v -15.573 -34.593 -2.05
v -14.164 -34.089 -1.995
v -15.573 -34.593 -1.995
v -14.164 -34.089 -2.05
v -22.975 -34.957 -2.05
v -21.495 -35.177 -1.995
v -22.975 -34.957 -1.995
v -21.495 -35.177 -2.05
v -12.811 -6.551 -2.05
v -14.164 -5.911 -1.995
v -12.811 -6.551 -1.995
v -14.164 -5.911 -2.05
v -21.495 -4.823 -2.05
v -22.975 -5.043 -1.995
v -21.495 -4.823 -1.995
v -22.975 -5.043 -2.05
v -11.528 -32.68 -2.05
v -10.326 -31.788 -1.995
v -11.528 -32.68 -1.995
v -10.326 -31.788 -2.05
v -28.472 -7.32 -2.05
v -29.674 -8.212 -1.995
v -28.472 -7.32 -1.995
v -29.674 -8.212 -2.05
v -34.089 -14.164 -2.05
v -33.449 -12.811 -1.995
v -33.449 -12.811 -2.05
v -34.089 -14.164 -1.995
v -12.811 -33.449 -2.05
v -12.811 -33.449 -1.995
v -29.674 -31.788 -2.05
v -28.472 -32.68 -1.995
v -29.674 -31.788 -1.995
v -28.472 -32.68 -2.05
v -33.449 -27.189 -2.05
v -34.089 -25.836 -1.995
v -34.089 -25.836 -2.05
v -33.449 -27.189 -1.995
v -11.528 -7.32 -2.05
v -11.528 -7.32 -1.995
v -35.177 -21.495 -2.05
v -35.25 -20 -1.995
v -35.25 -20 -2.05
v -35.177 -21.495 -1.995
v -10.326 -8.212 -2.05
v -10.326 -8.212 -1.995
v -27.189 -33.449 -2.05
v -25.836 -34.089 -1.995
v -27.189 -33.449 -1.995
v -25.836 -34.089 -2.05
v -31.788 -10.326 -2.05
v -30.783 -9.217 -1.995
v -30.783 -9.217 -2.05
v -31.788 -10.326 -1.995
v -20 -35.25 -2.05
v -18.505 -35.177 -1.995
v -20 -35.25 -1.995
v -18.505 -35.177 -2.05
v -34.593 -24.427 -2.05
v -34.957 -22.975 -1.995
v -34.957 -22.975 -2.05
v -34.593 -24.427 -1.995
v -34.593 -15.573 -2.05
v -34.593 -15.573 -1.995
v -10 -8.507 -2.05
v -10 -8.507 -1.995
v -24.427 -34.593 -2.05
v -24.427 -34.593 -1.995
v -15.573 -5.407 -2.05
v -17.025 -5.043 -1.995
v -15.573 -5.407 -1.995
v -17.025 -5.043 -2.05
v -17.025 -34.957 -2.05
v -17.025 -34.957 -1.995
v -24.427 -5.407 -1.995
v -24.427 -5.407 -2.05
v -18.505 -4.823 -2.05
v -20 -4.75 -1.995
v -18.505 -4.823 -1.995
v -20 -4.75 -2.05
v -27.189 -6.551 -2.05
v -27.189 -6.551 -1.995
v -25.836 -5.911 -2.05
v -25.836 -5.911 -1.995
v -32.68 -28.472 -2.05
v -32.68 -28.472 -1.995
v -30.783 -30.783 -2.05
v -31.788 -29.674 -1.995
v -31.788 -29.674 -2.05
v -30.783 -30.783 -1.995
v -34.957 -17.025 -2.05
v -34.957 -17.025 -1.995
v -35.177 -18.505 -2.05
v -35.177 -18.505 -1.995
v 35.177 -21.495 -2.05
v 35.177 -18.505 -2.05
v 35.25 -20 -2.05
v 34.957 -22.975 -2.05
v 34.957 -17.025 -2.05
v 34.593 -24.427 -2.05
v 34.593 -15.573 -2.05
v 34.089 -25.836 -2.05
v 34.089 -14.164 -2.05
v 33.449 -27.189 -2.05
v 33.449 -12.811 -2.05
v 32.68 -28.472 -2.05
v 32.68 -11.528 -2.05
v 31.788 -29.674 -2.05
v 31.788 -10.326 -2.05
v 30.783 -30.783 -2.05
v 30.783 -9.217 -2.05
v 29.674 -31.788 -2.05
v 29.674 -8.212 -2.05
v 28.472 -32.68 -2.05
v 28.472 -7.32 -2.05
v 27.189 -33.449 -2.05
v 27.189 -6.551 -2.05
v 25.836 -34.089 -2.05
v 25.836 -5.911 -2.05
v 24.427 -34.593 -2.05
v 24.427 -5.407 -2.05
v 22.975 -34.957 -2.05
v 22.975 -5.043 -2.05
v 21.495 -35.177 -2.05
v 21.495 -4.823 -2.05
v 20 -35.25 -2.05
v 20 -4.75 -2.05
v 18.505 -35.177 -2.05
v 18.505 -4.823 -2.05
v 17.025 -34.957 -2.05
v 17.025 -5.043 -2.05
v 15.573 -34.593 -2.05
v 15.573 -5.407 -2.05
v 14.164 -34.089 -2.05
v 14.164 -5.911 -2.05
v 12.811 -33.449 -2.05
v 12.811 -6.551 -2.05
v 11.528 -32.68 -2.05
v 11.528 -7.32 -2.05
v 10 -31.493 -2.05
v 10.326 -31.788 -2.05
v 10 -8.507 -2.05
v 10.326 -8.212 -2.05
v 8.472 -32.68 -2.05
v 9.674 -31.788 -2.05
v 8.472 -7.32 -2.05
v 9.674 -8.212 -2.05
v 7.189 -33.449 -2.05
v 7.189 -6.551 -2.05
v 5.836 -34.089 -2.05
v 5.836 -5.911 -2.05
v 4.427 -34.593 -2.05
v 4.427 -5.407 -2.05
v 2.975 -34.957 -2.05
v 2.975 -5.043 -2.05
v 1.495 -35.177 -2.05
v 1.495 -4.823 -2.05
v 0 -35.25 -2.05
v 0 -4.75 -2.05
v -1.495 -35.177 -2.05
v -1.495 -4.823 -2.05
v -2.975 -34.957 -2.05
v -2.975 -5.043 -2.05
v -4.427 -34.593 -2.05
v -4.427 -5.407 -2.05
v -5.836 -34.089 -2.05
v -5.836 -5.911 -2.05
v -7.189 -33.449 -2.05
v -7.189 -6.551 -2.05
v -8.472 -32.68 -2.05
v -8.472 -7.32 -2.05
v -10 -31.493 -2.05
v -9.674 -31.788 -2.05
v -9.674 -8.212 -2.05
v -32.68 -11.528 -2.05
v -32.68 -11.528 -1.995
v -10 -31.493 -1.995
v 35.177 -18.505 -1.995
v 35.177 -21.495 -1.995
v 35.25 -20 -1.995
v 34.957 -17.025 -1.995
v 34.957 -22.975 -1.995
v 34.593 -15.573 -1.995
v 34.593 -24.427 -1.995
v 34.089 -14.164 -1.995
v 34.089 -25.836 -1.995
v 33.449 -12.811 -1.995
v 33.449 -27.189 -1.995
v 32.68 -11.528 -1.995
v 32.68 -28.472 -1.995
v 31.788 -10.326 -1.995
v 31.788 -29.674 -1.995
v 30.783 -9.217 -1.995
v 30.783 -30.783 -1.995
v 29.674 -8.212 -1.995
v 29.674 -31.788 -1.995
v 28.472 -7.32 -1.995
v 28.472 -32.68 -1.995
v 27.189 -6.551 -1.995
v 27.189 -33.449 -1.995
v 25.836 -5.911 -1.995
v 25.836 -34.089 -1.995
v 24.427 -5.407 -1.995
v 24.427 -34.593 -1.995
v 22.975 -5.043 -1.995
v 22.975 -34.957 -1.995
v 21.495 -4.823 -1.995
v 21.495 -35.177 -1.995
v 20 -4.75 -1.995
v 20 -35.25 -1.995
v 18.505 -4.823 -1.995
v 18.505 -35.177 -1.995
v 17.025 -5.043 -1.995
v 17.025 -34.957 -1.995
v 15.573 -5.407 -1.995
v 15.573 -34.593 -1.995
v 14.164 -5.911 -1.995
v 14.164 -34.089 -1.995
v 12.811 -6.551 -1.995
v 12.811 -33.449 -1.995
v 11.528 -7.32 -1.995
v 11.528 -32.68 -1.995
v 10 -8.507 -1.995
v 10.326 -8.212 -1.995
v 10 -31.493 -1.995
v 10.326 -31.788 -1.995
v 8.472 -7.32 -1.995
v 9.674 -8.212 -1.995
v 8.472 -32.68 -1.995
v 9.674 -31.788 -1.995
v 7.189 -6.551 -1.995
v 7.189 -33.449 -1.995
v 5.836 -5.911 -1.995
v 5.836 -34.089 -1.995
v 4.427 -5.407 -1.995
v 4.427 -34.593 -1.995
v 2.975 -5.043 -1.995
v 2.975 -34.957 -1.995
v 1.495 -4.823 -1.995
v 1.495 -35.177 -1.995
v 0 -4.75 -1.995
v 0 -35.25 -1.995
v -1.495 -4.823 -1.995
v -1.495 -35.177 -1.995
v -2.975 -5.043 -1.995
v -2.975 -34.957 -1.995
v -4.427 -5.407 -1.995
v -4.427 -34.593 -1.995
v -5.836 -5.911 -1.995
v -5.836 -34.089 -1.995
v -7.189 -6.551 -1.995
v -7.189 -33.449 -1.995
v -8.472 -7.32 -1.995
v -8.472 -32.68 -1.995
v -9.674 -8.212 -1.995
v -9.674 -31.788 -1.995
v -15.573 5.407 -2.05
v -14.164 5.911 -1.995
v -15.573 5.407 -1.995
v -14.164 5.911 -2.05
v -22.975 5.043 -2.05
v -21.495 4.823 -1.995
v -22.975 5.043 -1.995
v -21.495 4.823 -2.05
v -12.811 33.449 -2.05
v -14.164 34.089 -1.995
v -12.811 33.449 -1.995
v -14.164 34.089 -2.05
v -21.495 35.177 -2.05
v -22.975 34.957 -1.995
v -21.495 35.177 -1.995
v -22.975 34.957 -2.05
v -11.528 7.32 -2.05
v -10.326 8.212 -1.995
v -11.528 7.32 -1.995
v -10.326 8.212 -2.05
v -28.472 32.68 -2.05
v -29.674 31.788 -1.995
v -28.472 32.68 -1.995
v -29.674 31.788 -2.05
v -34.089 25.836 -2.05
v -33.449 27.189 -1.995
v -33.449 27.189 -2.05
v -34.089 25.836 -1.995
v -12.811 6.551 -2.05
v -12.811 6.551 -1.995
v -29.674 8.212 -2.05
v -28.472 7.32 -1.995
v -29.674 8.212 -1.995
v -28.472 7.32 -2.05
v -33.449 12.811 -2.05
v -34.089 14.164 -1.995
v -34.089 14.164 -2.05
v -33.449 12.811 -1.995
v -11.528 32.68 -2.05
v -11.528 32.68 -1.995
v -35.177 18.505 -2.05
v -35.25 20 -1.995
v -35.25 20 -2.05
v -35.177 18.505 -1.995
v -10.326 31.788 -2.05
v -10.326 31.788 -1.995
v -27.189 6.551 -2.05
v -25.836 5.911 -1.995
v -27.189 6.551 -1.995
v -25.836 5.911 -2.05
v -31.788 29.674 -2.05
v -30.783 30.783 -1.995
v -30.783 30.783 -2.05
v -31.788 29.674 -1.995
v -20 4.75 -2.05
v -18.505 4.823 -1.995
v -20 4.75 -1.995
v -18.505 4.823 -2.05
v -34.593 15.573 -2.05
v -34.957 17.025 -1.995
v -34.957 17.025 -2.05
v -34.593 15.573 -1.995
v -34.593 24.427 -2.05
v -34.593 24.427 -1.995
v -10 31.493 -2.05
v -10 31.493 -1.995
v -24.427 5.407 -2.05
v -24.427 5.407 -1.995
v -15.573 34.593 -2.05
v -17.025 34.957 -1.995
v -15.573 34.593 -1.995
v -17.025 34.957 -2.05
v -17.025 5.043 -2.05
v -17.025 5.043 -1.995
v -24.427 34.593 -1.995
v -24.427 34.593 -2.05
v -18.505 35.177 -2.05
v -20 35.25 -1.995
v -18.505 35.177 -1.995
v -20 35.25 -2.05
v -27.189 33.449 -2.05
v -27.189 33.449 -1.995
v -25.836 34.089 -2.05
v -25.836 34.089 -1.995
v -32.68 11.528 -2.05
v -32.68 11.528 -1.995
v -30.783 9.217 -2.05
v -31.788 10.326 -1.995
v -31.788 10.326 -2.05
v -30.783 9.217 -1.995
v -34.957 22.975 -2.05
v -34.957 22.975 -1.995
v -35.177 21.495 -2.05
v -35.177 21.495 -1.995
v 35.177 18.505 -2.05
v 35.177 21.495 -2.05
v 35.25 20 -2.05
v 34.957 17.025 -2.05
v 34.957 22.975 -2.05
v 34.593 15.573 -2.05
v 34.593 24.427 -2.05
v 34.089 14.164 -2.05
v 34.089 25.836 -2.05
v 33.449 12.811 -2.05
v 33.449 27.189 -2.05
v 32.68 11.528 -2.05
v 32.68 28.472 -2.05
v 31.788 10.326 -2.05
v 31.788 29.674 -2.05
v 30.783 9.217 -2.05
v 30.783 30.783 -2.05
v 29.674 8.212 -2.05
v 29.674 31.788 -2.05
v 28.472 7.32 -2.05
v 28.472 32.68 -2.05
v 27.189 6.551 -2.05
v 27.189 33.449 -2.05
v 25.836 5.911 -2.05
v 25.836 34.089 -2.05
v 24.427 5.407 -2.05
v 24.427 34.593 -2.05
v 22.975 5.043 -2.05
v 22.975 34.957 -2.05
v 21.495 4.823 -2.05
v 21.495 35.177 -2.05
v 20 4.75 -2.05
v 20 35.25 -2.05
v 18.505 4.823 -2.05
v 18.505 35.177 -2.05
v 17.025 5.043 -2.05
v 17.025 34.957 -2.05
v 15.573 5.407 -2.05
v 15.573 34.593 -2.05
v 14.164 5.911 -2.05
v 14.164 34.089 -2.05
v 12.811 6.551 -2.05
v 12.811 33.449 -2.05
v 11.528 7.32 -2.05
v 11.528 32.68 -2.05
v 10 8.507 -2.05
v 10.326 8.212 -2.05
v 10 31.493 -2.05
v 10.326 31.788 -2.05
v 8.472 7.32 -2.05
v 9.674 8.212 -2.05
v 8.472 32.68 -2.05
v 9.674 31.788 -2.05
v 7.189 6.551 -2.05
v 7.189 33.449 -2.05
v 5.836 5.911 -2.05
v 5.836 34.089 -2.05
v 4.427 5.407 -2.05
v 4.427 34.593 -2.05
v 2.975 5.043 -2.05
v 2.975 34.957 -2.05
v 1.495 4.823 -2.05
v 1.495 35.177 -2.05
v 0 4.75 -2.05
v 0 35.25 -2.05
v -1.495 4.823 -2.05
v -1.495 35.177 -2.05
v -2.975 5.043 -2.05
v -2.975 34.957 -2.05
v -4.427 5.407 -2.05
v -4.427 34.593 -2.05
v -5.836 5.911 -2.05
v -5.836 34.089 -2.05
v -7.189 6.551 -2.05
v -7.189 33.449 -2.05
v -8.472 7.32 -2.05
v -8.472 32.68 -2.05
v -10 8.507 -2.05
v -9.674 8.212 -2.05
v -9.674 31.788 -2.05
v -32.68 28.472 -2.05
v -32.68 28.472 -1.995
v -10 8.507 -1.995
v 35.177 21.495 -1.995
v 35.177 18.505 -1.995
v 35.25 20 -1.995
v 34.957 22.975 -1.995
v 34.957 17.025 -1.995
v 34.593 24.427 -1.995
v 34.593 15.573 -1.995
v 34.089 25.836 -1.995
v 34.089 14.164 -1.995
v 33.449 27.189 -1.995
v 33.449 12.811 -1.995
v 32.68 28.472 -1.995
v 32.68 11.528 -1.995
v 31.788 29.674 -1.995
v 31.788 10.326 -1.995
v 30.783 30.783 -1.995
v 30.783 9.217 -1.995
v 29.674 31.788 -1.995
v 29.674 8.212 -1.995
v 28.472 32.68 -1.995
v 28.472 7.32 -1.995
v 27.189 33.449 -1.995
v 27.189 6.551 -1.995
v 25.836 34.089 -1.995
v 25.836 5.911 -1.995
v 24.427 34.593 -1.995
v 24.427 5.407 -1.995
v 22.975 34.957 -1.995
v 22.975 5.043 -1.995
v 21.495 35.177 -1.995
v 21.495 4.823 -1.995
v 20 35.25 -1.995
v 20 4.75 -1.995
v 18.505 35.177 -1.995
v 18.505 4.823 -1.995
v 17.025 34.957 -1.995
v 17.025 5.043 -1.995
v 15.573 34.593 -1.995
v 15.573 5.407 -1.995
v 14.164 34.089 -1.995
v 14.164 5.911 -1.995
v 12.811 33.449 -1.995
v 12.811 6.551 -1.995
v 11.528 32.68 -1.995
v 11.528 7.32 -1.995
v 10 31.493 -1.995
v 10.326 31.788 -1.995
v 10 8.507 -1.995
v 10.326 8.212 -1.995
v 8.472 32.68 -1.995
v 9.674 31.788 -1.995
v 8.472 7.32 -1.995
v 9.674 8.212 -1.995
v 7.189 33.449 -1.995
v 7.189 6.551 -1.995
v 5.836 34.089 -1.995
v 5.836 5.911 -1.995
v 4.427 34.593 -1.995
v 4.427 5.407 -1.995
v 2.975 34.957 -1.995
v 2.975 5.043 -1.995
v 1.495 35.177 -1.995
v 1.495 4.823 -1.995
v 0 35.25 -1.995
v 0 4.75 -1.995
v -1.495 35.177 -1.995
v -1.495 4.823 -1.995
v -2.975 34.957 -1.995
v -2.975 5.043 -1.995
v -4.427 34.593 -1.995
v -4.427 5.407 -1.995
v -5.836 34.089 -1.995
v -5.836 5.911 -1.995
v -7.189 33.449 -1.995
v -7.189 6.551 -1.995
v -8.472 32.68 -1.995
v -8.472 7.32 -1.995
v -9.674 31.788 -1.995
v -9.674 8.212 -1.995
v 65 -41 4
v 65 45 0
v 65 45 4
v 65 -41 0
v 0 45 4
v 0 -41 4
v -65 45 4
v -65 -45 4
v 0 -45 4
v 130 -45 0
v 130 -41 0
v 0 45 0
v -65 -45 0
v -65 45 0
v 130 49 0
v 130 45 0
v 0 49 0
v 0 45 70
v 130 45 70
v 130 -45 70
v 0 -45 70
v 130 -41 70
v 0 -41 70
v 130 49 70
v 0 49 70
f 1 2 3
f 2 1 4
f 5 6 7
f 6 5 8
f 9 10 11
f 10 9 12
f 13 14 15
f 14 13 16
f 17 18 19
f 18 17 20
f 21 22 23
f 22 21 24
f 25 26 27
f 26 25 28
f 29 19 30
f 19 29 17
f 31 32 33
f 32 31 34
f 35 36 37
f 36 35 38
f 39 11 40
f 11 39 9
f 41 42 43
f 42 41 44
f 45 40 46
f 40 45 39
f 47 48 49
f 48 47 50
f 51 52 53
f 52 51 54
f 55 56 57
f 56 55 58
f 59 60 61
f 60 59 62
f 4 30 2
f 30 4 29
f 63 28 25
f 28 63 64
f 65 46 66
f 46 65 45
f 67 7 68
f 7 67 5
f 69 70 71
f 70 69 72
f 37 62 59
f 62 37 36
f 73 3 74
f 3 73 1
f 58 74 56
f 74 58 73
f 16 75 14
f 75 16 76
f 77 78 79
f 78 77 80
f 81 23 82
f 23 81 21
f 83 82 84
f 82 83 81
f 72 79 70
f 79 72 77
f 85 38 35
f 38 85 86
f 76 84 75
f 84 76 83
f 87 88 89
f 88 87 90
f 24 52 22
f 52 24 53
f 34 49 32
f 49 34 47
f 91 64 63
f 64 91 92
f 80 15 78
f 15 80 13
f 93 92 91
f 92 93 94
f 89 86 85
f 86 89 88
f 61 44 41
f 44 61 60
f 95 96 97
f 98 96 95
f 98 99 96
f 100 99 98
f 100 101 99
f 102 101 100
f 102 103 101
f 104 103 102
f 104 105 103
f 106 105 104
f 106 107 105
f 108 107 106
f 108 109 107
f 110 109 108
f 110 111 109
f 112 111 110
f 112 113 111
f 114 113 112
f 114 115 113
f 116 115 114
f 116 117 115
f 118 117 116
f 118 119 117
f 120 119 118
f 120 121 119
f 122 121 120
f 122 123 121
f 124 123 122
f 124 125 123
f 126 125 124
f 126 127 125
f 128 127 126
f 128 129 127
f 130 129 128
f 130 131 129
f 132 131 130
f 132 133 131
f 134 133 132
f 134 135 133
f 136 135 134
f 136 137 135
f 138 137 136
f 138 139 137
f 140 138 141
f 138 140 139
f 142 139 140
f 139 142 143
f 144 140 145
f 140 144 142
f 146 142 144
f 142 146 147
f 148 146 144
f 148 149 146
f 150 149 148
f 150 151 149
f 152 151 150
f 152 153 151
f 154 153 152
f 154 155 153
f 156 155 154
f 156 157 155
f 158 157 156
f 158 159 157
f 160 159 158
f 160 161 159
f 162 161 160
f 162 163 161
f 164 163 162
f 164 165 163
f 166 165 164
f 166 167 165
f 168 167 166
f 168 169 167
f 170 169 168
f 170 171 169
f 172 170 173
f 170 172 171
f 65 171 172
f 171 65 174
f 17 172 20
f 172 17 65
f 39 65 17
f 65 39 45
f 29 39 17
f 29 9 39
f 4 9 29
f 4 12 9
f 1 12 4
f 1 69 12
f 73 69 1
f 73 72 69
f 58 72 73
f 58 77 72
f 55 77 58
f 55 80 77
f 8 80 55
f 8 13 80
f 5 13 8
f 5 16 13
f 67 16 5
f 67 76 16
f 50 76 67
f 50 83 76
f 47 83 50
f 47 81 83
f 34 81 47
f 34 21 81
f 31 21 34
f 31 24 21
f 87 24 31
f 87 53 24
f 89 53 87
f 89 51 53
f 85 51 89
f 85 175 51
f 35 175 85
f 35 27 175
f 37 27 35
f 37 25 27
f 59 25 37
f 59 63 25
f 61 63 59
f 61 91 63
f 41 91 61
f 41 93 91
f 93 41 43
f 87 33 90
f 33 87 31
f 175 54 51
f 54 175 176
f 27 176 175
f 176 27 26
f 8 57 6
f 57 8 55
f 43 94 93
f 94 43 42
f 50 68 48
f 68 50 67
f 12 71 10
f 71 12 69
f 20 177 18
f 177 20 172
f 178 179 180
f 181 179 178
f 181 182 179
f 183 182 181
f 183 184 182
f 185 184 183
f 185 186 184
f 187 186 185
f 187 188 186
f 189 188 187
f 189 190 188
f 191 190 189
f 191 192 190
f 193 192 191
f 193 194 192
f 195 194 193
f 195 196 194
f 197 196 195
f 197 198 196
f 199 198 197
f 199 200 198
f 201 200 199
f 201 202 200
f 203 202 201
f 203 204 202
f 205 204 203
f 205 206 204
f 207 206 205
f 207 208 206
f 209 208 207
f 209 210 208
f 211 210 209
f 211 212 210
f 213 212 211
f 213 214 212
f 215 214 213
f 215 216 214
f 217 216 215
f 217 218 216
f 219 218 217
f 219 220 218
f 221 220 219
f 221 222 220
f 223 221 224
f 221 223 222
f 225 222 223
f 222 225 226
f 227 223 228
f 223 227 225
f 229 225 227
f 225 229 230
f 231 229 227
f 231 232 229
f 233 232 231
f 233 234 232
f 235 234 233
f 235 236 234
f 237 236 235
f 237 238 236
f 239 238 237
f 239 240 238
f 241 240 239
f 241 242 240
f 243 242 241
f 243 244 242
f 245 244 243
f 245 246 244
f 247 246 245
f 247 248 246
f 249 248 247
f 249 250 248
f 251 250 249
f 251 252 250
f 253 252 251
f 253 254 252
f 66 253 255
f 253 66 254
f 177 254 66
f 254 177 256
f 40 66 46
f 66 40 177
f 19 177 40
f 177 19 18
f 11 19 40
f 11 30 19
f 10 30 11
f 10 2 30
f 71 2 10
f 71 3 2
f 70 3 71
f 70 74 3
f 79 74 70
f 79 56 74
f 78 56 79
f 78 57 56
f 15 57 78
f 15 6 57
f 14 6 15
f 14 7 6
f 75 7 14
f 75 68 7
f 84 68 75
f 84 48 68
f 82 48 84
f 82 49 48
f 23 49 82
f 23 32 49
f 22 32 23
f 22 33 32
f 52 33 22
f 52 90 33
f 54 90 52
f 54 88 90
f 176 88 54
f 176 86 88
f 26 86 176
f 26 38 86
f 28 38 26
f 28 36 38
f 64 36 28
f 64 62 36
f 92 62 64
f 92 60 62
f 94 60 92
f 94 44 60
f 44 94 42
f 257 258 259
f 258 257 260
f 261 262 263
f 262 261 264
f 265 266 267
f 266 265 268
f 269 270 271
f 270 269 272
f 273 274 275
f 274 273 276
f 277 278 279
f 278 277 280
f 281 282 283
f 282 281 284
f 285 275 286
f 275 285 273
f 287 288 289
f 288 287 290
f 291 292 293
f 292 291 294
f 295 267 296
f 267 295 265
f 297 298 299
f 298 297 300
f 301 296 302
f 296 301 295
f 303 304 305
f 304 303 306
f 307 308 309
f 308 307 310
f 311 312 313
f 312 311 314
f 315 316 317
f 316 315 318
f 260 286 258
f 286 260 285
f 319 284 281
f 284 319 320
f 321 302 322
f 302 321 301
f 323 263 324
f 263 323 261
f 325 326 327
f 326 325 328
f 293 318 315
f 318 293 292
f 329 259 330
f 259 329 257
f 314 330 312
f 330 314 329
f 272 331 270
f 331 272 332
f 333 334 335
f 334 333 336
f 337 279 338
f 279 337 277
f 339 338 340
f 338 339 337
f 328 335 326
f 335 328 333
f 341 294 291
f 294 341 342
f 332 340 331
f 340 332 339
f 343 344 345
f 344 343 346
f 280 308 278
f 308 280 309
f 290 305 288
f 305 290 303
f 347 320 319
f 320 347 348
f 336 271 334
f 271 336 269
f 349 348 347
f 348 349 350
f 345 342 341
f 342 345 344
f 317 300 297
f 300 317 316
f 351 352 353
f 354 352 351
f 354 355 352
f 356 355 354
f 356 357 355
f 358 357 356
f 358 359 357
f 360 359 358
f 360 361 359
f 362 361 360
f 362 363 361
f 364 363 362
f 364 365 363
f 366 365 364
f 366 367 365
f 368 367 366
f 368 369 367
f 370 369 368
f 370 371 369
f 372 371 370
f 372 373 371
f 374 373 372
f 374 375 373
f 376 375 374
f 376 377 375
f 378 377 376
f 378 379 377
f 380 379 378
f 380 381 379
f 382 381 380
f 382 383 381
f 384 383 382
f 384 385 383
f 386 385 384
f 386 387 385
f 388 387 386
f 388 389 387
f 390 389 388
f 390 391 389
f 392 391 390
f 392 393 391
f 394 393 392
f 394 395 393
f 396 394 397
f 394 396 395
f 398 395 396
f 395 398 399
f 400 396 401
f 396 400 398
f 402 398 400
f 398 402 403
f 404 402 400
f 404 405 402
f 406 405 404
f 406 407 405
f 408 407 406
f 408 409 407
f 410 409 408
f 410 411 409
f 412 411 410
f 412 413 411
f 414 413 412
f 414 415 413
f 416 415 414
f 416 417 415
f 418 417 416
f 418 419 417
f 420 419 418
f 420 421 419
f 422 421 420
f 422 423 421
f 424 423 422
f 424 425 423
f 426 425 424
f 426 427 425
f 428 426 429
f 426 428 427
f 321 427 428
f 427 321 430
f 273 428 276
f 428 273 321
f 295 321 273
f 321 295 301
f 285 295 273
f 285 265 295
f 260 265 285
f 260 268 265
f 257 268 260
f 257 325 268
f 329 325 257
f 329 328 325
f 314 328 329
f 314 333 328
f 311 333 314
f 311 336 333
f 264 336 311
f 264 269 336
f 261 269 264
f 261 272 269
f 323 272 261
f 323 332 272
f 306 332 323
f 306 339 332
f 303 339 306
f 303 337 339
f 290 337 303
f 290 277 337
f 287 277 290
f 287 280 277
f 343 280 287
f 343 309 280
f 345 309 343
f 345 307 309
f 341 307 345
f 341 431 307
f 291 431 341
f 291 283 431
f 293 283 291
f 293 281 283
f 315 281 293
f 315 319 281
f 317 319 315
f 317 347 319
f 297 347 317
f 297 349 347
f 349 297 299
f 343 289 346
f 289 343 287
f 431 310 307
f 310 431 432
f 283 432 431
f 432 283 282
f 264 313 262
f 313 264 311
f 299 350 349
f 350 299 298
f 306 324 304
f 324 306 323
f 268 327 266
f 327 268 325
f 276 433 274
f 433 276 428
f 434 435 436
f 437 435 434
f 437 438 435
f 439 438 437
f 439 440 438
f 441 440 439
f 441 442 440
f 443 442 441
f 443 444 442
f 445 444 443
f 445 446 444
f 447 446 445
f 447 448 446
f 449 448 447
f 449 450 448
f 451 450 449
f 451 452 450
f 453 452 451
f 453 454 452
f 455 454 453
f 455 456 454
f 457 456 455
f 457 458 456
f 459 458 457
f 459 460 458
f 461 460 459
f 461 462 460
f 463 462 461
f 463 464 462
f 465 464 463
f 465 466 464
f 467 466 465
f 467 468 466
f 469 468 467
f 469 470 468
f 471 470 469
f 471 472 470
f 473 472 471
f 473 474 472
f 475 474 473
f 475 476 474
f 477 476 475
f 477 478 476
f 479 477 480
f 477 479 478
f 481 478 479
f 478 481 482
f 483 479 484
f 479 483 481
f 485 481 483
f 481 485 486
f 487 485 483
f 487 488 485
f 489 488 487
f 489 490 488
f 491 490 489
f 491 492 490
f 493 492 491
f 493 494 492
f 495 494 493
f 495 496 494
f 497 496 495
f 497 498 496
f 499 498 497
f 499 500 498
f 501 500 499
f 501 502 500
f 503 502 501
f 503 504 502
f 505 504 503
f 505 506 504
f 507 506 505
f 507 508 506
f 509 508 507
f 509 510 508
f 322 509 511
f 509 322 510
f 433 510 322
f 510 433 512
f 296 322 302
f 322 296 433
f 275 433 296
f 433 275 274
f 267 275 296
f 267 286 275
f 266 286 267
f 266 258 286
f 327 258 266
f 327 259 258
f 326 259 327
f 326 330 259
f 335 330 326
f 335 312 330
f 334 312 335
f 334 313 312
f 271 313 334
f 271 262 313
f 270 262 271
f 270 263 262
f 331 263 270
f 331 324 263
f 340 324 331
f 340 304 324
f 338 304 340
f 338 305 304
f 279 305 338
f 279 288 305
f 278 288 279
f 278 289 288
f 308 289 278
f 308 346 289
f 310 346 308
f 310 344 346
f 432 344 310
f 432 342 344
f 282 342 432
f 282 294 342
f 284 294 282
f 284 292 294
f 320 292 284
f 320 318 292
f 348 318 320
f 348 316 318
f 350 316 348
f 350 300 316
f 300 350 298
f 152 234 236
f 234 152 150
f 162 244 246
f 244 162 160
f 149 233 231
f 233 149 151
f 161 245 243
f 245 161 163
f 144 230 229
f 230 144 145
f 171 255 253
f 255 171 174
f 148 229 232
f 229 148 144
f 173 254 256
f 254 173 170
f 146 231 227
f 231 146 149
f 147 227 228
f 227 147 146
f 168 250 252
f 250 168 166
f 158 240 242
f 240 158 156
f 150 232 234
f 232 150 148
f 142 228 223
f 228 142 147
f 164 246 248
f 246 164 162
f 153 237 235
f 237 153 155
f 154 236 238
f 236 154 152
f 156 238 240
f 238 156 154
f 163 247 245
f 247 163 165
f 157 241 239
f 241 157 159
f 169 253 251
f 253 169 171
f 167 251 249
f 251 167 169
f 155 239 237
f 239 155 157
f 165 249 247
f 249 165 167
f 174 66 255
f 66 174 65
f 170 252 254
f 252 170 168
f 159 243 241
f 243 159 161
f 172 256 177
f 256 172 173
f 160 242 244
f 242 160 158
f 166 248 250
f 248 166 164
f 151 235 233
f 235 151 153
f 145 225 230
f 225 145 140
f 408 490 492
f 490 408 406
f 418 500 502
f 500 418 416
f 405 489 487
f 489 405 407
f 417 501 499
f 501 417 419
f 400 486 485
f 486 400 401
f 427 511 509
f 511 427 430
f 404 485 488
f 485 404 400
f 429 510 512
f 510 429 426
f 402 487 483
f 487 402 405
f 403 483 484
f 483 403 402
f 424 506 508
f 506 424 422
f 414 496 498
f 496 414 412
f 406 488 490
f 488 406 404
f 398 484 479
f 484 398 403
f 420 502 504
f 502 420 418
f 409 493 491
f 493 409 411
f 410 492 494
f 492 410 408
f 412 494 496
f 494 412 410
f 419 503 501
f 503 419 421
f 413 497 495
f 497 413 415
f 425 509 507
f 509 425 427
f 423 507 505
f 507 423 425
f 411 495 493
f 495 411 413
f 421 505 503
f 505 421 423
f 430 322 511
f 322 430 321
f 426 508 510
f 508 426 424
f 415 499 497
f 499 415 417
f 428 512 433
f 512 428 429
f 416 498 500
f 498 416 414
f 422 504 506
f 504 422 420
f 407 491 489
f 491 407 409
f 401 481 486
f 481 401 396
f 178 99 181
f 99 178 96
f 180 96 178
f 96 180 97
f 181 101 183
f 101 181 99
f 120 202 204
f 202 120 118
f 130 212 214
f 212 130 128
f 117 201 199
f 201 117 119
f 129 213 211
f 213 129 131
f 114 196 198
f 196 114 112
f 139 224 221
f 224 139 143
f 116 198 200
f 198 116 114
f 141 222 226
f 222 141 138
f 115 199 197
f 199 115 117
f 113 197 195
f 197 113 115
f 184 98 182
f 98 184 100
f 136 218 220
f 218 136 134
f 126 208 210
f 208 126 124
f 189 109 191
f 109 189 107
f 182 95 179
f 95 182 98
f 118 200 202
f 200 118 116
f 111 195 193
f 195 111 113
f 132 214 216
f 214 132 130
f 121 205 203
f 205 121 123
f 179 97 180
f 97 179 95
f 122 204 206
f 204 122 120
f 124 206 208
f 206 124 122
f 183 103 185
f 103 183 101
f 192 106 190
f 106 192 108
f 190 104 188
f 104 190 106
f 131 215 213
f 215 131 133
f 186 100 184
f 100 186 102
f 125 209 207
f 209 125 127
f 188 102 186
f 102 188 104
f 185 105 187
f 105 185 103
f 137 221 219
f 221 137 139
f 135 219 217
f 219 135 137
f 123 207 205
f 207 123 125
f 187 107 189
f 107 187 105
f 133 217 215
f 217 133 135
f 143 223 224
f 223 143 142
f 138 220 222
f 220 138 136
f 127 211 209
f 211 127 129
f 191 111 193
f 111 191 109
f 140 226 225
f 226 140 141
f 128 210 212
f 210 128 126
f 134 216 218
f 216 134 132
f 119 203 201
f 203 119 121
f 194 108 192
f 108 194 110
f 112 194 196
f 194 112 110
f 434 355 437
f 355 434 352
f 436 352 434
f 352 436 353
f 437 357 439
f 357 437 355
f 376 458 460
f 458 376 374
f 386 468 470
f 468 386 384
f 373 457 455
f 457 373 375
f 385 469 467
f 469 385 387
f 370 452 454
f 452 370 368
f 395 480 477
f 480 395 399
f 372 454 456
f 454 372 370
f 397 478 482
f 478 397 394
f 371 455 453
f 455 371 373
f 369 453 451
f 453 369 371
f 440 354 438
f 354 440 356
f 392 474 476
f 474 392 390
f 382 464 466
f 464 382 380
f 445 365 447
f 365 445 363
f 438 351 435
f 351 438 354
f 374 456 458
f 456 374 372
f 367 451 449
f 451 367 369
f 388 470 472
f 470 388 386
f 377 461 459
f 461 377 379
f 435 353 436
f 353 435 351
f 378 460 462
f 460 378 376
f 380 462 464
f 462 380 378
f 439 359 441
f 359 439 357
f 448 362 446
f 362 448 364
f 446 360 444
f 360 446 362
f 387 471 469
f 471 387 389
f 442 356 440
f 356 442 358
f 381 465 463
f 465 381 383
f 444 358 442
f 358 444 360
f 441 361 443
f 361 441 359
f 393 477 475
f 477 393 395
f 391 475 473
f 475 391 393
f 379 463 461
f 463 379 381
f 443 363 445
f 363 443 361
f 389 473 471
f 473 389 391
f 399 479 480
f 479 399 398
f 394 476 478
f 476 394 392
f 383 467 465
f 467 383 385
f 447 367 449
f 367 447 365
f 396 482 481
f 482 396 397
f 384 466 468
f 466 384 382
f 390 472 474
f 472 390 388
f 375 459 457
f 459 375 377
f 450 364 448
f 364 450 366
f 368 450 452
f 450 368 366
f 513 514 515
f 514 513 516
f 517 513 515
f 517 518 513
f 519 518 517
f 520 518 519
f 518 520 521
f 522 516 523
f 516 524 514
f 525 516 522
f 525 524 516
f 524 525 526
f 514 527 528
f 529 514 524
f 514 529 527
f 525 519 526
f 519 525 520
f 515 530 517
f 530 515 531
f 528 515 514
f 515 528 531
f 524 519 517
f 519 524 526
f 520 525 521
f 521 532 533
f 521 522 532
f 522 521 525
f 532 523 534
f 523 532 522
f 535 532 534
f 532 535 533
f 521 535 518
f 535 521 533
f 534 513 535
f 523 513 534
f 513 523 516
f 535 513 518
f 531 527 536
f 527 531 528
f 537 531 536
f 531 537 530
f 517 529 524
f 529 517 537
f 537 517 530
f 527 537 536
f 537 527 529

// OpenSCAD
// Rack for six 50 mL conical (Falcon-type) tubes
// Print orientation: Upside down (walls up, holes in plate).
// After printing, flip over to stand on walls.

// --- Dimensions ---
// Plate dimensions (Centered on Origin)
$plate_length = 130; // X
$plate_width = 90;   // Y
$plate_thickness = 4; // Z

// Hole specifications
$hole_diameter = 30.5;
$hole_spacing_x = 40; // Centre-to-centre
$hole_spacing_y = 40; // Centre-to-centre

// Wall specifications
$wall_length = 130;   // X
$wall_thickness = 4;  // Y
$wall_height = 70;    // Z (total height from bed)

// --- Configuration ---
$fn = 64; // Smooth curves for holes

// --- Main Module ---
module tube_rack() {
    union() {
        // 1. The Base Plate
        // Lies on Z=0 to Z=$plate_thickness. Centered on origin.
        translate([-($plate_length)/2, -($plate_width)/2, 0]) {
            cube([
                $plate_length,
                $plate_width,
                $plate_thickness
            ], center = false);
        }

        // 2. The Through-Holes
        // Cut into the plate. Extend slightly past Z=0 to ensure clean cut.
        // Positions are centered on the origin (plate center).
        for (x = [-($hole_spacing_x)/2, 0, ($hole_spacing_x)/2]) {
            for (y = [-($hole_spacing_y)/2, ($hole_spacing_y)/2]) {
                translate([x, y, 0]) {
                    difference() {
                        // The hole cylinder (slightly larger to ensure clean cut)
                        cylinder(
                            h = $plate_thickness + 0.1,
                            d = $hole_diameter,
                            center = true
                        );
                        // The solid plate part (slightly smaller to avoid coplanar faces)
                        cube([
                            $hole_diameter,
                            $hole_diameter,
                            $plate_thickness - 0.01
                        ], center = true);
                    }
                }
            }
        }

        // 3. The Side Walls
        // Two walls along the long edges (Y = +/- $plate_width/2).
        // They rise from Z=0 to Z=$wall_height.
        // Placed flush with the outer edge of the plate.
        
        // Left Wall (at Y = -$plate_width/2)
        translate([0, -($plate_width)/2, 0]) {
            cube([
                $wall_length,
                $wall_thickness,
                $wall_height
            ], center = false);
        }

        // Right Wall (at Y = +$plate_width/2)
        translate([0, ($plate_width)/2, 0]) {
            cube([
                $wall_length,
                $wall_thickness,
                $wall_height
            ], center = false);
        }
    }
}

// Generate the part
tube_rack();
